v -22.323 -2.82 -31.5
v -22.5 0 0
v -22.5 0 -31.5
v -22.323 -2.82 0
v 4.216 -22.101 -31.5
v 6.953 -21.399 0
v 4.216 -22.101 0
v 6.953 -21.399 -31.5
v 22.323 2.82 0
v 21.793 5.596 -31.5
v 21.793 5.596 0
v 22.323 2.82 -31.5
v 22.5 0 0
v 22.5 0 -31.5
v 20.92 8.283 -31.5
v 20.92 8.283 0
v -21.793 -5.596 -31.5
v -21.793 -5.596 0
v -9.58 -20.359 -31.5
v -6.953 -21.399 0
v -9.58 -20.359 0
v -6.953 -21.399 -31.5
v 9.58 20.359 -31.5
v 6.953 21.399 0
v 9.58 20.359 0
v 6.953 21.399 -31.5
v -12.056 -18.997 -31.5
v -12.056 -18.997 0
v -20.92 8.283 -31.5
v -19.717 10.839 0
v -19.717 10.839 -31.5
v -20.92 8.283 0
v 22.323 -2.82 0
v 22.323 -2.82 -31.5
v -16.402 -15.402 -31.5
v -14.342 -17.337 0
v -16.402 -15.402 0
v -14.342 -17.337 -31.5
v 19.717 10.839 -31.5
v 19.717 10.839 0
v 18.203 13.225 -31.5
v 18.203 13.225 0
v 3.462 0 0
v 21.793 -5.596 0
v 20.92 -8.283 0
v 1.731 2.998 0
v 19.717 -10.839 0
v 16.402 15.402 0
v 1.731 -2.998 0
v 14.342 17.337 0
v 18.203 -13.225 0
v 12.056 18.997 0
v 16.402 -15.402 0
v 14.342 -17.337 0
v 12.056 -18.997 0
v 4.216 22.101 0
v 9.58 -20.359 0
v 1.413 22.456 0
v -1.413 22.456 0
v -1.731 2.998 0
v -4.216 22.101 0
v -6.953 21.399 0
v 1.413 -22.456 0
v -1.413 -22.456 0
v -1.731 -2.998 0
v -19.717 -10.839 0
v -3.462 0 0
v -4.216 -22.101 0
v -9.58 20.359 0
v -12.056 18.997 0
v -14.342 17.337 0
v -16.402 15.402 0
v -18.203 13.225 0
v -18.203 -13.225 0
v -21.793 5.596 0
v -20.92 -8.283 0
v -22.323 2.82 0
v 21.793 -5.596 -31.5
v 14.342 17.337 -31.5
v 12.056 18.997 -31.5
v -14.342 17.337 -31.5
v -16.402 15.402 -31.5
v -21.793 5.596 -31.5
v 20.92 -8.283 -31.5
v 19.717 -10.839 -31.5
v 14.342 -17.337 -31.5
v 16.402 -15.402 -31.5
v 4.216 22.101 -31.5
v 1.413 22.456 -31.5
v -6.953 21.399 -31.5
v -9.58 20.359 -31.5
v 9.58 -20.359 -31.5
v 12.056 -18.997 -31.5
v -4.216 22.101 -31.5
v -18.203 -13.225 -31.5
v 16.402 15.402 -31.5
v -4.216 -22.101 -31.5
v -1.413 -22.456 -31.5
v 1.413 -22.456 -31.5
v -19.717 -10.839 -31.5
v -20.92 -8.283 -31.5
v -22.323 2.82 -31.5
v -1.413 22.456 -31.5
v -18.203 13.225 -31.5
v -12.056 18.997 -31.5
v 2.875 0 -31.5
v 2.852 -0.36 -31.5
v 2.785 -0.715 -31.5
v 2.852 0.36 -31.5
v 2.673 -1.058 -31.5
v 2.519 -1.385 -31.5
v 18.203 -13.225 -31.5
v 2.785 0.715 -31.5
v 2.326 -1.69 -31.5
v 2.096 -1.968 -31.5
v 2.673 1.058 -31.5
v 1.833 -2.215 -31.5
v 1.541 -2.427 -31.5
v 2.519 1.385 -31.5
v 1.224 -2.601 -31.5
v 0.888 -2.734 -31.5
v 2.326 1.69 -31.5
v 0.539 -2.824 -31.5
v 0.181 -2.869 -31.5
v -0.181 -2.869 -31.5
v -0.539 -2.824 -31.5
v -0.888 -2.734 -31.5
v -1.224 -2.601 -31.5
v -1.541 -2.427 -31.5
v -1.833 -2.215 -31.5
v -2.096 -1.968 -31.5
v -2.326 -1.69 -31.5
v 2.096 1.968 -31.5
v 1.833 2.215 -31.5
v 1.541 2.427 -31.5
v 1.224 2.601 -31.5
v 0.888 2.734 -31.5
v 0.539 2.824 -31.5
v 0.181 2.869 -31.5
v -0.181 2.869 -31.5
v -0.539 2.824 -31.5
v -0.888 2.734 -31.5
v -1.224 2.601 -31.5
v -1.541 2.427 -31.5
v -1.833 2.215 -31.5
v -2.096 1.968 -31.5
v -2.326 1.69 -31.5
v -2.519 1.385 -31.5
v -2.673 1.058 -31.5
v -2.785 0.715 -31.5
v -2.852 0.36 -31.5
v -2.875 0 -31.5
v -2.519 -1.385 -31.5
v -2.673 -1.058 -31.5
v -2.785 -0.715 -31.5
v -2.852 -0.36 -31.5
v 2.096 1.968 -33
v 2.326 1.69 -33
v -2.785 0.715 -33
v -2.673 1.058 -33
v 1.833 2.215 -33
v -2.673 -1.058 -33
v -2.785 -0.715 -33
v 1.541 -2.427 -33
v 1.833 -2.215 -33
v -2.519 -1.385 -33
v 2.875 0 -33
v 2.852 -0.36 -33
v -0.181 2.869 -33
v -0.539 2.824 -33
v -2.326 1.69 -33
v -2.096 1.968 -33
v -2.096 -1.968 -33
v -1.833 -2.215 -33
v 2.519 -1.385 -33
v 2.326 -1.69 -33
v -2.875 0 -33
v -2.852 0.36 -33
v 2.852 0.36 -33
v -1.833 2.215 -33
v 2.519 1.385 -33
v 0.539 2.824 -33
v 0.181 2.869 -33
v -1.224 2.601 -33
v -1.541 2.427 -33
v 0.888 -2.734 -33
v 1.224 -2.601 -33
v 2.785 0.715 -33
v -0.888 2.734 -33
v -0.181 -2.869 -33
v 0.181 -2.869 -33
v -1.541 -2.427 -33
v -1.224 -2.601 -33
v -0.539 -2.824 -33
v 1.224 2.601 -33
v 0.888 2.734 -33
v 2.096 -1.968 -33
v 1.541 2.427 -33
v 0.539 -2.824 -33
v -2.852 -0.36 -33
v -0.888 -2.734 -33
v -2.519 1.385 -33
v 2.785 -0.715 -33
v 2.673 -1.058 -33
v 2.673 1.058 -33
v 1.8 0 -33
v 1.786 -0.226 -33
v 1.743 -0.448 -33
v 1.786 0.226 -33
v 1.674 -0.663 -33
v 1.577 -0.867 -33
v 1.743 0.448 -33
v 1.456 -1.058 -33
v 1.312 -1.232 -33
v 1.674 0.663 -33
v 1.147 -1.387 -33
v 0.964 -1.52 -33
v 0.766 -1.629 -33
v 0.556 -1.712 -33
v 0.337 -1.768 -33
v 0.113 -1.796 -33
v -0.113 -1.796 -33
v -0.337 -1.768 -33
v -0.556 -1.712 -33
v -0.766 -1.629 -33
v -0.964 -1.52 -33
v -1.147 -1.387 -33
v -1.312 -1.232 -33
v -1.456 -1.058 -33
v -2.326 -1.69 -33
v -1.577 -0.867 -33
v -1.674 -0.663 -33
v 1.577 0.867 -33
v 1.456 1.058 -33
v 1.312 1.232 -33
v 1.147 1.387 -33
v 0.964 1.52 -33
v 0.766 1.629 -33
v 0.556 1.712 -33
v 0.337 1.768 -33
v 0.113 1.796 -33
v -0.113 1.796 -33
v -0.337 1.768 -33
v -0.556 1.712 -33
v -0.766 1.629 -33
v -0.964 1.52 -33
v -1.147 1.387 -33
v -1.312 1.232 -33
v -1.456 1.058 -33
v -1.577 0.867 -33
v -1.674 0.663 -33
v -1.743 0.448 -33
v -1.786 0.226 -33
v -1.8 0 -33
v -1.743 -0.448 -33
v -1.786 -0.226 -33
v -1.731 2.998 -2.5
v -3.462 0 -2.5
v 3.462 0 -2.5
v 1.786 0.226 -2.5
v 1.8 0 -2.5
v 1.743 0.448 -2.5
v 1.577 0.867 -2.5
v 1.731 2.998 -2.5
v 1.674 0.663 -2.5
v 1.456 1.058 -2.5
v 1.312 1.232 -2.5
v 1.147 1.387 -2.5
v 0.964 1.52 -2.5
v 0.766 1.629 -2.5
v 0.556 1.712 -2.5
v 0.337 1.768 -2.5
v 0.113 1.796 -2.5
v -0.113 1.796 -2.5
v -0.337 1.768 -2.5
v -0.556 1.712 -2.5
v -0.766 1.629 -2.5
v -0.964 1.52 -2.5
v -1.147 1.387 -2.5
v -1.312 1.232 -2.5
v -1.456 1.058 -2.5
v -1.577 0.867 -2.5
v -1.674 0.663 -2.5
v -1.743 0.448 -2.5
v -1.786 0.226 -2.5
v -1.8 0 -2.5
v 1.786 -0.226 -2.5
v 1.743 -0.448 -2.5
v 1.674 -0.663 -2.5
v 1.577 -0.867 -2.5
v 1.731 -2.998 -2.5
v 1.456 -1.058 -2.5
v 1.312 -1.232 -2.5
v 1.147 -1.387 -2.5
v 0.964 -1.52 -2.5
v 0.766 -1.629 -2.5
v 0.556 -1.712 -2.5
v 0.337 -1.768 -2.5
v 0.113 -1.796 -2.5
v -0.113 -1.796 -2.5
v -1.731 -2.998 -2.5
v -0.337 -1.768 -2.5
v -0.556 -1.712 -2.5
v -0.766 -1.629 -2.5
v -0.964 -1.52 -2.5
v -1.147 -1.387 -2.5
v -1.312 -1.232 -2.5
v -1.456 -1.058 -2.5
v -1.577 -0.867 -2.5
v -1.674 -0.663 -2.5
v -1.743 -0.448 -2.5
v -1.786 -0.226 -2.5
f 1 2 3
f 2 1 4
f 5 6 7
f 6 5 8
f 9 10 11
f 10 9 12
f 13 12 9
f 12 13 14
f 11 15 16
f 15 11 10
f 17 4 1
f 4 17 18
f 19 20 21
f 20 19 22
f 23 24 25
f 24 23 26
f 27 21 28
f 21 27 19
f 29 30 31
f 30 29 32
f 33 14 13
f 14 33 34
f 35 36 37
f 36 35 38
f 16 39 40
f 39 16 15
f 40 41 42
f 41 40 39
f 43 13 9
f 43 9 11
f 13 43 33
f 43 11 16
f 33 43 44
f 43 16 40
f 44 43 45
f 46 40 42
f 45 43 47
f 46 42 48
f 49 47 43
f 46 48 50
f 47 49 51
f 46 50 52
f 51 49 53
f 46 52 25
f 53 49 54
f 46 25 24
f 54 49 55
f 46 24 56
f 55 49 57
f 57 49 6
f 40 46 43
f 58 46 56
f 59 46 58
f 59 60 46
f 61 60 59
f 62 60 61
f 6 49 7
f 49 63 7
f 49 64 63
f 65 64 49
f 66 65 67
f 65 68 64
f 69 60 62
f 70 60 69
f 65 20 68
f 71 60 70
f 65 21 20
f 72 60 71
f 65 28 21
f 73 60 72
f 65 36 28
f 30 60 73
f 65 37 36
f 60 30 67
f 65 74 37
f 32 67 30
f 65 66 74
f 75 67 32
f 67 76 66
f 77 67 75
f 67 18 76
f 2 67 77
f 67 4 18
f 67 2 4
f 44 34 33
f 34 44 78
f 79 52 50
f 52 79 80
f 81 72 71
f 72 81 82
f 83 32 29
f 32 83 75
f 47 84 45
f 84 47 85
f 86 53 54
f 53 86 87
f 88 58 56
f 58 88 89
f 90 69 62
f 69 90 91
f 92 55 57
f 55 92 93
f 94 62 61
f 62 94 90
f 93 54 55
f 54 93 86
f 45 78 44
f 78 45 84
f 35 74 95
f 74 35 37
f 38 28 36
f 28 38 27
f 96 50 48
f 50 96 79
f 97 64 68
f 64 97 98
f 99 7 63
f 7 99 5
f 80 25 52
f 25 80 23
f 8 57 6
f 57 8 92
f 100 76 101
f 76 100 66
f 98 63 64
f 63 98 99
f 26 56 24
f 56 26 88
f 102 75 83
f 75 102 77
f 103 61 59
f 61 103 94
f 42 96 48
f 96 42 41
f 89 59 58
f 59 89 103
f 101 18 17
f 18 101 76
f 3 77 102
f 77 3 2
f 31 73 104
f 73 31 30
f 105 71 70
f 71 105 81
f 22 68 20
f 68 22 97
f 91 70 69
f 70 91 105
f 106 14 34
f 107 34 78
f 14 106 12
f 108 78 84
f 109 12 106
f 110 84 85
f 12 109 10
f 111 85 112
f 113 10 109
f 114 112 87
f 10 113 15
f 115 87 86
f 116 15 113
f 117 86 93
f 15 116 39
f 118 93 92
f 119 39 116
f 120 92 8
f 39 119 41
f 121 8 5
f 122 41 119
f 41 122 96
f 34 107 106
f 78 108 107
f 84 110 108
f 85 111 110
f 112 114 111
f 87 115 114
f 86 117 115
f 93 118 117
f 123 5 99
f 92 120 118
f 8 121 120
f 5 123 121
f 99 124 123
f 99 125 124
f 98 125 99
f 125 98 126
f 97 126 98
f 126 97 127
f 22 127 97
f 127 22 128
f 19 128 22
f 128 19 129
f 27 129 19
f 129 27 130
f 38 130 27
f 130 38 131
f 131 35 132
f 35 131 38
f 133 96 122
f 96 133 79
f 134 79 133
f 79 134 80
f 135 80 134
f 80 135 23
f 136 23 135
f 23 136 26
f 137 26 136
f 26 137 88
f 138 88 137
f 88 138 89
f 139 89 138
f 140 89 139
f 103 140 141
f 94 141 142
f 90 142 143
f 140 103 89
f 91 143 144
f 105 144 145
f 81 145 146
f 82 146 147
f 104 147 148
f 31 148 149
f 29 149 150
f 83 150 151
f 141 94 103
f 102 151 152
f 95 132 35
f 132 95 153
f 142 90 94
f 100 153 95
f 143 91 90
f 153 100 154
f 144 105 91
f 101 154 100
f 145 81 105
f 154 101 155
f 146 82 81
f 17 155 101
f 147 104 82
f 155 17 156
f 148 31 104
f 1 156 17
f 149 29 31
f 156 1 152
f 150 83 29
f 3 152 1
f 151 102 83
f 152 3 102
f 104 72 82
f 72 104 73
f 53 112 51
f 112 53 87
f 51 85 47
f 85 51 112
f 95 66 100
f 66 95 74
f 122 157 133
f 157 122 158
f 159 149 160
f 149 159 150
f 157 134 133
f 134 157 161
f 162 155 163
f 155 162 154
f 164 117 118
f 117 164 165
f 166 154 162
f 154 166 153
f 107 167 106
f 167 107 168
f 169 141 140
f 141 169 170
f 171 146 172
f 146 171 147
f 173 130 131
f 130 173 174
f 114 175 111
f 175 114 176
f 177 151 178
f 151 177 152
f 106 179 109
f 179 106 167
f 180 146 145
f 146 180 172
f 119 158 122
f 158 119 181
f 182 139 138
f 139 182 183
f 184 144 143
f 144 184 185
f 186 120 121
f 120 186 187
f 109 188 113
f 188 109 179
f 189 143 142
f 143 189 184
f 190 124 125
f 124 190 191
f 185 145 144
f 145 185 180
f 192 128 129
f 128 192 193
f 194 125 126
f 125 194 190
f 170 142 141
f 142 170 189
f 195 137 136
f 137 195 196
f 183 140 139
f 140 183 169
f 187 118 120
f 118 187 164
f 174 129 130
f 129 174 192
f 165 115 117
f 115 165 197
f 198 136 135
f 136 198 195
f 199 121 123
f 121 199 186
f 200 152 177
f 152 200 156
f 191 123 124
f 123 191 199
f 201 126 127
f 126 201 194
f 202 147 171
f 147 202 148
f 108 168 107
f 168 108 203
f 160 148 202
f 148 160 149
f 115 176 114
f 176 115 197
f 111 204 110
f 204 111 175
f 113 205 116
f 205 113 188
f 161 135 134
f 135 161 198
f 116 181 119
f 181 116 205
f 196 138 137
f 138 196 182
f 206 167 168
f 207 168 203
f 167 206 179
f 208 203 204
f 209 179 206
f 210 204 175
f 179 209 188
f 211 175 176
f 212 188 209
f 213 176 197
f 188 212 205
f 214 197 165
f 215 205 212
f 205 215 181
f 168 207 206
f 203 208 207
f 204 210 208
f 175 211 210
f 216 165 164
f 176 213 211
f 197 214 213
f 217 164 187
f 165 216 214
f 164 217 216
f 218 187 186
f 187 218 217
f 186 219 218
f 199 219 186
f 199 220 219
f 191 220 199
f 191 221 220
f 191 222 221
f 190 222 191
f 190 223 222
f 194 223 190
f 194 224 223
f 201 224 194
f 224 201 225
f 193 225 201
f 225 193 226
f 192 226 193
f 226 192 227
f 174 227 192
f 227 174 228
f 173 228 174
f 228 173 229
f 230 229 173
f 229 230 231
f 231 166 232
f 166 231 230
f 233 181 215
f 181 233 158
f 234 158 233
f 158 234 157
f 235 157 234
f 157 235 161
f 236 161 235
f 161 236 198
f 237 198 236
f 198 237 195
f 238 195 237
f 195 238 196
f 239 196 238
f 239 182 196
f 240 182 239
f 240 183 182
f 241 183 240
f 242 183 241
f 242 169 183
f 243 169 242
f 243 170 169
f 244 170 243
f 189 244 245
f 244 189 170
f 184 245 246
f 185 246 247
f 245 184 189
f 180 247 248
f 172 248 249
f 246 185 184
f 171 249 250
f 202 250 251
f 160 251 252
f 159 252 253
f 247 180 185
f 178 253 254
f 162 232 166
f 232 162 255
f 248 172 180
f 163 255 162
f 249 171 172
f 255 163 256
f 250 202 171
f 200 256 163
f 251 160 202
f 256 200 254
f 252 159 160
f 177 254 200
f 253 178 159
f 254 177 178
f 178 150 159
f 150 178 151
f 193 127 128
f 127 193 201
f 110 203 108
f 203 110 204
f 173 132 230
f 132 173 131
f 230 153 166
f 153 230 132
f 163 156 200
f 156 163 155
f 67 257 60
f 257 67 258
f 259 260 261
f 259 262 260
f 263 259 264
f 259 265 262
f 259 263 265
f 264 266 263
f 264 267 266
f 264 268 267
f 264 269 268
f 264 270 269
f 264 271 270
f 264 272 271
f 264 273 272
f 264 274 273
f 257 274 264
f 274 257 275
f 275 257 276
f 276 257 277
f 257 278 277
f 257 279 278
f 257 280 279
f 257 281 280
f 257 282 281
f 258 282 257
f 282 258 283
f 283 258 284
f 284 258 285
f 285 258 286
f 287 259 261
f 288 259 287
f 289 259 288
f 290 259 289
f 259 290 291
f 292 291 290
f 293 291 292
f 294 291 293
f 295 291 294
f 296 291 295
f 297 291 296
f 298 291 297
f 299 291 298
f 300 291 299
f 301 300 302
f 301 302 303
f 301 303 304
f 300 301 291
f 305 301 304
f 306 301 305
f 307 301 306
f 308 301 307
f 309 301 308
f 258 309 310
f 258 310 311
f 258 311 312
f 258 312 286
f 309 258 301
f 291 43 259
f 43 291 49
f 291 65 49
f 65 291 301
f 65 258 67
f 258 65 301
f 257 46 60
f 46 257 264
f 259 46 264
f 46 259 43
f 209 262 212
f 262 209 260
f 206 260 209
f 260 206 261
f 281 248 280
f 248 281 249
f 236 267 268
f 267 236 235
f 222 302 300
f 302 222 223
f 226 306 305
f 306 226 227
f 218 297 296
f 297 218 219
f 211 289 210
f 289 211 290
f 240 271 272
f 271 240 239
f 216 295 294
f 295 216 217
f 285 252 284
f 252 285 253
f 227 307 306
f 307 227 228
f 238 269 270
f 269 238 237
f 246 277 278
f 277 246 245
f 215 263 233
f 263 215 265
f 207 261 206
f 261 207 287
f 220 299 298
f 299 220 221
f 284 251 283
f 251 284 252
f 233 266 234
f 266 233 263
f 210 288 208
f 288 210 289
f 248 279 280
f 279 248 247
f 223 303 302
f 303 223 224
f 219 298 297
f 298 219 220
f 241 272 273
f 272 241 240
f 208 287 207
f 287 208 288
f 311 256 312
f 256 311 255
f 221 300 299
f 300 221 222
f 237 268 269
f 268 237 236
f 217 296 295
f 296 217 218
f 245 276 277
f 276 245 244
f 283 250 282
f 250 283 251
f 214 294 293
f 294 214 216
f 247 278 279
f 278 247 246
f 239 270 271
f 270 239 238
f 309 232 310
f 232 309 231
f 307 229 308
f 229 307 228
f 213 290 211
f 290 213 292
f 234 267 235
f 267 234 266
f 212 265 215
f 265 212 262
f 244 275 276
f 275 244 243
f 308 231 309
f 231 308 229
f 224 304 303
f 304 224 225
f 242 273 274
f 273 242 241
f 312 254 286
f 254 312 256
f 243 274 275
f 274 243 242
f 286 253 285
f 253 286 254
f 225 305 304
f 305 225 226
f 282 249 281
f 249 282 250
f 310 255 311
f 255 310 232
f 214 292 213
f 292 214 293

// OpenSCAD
$fn = 50;

difference() {
	union() {
		translate(v = [0, 0, -31.5]) {
			cylinder(h = 31.5, r = 22.5);
		}
		#translate(v = [0, 0, -33.0]) {
			cylinder(h = 33, r = 2.875);
		}
	}
	union() {
		translate(v = [0, 0, 0]) {
			rotate(a = [0, 0, 0]) {
				difference() {
					union() {
						translate(v = [0, 0, -2.5]) {
							linear_extrude(height = 2.5) {
								polygon(points = [[3.4619999999999997, 0.0], [1.7310000000000003, 2.9981799479017264], [-1.7309999999999992, 2.9981799479017264], [-3.4619999999999997, 4.2397272186481365e-16], [-1.7310000000000014, -2.998179947901726], [1.7309999999999977, -2.9981799479017277]]);
							}
						}
					}
					union();
				}
			}
		}
		#translate(v = [0, 0, -100.0]) {
			cylinder(h = 200, r = 1.8);
		}
	}
}
